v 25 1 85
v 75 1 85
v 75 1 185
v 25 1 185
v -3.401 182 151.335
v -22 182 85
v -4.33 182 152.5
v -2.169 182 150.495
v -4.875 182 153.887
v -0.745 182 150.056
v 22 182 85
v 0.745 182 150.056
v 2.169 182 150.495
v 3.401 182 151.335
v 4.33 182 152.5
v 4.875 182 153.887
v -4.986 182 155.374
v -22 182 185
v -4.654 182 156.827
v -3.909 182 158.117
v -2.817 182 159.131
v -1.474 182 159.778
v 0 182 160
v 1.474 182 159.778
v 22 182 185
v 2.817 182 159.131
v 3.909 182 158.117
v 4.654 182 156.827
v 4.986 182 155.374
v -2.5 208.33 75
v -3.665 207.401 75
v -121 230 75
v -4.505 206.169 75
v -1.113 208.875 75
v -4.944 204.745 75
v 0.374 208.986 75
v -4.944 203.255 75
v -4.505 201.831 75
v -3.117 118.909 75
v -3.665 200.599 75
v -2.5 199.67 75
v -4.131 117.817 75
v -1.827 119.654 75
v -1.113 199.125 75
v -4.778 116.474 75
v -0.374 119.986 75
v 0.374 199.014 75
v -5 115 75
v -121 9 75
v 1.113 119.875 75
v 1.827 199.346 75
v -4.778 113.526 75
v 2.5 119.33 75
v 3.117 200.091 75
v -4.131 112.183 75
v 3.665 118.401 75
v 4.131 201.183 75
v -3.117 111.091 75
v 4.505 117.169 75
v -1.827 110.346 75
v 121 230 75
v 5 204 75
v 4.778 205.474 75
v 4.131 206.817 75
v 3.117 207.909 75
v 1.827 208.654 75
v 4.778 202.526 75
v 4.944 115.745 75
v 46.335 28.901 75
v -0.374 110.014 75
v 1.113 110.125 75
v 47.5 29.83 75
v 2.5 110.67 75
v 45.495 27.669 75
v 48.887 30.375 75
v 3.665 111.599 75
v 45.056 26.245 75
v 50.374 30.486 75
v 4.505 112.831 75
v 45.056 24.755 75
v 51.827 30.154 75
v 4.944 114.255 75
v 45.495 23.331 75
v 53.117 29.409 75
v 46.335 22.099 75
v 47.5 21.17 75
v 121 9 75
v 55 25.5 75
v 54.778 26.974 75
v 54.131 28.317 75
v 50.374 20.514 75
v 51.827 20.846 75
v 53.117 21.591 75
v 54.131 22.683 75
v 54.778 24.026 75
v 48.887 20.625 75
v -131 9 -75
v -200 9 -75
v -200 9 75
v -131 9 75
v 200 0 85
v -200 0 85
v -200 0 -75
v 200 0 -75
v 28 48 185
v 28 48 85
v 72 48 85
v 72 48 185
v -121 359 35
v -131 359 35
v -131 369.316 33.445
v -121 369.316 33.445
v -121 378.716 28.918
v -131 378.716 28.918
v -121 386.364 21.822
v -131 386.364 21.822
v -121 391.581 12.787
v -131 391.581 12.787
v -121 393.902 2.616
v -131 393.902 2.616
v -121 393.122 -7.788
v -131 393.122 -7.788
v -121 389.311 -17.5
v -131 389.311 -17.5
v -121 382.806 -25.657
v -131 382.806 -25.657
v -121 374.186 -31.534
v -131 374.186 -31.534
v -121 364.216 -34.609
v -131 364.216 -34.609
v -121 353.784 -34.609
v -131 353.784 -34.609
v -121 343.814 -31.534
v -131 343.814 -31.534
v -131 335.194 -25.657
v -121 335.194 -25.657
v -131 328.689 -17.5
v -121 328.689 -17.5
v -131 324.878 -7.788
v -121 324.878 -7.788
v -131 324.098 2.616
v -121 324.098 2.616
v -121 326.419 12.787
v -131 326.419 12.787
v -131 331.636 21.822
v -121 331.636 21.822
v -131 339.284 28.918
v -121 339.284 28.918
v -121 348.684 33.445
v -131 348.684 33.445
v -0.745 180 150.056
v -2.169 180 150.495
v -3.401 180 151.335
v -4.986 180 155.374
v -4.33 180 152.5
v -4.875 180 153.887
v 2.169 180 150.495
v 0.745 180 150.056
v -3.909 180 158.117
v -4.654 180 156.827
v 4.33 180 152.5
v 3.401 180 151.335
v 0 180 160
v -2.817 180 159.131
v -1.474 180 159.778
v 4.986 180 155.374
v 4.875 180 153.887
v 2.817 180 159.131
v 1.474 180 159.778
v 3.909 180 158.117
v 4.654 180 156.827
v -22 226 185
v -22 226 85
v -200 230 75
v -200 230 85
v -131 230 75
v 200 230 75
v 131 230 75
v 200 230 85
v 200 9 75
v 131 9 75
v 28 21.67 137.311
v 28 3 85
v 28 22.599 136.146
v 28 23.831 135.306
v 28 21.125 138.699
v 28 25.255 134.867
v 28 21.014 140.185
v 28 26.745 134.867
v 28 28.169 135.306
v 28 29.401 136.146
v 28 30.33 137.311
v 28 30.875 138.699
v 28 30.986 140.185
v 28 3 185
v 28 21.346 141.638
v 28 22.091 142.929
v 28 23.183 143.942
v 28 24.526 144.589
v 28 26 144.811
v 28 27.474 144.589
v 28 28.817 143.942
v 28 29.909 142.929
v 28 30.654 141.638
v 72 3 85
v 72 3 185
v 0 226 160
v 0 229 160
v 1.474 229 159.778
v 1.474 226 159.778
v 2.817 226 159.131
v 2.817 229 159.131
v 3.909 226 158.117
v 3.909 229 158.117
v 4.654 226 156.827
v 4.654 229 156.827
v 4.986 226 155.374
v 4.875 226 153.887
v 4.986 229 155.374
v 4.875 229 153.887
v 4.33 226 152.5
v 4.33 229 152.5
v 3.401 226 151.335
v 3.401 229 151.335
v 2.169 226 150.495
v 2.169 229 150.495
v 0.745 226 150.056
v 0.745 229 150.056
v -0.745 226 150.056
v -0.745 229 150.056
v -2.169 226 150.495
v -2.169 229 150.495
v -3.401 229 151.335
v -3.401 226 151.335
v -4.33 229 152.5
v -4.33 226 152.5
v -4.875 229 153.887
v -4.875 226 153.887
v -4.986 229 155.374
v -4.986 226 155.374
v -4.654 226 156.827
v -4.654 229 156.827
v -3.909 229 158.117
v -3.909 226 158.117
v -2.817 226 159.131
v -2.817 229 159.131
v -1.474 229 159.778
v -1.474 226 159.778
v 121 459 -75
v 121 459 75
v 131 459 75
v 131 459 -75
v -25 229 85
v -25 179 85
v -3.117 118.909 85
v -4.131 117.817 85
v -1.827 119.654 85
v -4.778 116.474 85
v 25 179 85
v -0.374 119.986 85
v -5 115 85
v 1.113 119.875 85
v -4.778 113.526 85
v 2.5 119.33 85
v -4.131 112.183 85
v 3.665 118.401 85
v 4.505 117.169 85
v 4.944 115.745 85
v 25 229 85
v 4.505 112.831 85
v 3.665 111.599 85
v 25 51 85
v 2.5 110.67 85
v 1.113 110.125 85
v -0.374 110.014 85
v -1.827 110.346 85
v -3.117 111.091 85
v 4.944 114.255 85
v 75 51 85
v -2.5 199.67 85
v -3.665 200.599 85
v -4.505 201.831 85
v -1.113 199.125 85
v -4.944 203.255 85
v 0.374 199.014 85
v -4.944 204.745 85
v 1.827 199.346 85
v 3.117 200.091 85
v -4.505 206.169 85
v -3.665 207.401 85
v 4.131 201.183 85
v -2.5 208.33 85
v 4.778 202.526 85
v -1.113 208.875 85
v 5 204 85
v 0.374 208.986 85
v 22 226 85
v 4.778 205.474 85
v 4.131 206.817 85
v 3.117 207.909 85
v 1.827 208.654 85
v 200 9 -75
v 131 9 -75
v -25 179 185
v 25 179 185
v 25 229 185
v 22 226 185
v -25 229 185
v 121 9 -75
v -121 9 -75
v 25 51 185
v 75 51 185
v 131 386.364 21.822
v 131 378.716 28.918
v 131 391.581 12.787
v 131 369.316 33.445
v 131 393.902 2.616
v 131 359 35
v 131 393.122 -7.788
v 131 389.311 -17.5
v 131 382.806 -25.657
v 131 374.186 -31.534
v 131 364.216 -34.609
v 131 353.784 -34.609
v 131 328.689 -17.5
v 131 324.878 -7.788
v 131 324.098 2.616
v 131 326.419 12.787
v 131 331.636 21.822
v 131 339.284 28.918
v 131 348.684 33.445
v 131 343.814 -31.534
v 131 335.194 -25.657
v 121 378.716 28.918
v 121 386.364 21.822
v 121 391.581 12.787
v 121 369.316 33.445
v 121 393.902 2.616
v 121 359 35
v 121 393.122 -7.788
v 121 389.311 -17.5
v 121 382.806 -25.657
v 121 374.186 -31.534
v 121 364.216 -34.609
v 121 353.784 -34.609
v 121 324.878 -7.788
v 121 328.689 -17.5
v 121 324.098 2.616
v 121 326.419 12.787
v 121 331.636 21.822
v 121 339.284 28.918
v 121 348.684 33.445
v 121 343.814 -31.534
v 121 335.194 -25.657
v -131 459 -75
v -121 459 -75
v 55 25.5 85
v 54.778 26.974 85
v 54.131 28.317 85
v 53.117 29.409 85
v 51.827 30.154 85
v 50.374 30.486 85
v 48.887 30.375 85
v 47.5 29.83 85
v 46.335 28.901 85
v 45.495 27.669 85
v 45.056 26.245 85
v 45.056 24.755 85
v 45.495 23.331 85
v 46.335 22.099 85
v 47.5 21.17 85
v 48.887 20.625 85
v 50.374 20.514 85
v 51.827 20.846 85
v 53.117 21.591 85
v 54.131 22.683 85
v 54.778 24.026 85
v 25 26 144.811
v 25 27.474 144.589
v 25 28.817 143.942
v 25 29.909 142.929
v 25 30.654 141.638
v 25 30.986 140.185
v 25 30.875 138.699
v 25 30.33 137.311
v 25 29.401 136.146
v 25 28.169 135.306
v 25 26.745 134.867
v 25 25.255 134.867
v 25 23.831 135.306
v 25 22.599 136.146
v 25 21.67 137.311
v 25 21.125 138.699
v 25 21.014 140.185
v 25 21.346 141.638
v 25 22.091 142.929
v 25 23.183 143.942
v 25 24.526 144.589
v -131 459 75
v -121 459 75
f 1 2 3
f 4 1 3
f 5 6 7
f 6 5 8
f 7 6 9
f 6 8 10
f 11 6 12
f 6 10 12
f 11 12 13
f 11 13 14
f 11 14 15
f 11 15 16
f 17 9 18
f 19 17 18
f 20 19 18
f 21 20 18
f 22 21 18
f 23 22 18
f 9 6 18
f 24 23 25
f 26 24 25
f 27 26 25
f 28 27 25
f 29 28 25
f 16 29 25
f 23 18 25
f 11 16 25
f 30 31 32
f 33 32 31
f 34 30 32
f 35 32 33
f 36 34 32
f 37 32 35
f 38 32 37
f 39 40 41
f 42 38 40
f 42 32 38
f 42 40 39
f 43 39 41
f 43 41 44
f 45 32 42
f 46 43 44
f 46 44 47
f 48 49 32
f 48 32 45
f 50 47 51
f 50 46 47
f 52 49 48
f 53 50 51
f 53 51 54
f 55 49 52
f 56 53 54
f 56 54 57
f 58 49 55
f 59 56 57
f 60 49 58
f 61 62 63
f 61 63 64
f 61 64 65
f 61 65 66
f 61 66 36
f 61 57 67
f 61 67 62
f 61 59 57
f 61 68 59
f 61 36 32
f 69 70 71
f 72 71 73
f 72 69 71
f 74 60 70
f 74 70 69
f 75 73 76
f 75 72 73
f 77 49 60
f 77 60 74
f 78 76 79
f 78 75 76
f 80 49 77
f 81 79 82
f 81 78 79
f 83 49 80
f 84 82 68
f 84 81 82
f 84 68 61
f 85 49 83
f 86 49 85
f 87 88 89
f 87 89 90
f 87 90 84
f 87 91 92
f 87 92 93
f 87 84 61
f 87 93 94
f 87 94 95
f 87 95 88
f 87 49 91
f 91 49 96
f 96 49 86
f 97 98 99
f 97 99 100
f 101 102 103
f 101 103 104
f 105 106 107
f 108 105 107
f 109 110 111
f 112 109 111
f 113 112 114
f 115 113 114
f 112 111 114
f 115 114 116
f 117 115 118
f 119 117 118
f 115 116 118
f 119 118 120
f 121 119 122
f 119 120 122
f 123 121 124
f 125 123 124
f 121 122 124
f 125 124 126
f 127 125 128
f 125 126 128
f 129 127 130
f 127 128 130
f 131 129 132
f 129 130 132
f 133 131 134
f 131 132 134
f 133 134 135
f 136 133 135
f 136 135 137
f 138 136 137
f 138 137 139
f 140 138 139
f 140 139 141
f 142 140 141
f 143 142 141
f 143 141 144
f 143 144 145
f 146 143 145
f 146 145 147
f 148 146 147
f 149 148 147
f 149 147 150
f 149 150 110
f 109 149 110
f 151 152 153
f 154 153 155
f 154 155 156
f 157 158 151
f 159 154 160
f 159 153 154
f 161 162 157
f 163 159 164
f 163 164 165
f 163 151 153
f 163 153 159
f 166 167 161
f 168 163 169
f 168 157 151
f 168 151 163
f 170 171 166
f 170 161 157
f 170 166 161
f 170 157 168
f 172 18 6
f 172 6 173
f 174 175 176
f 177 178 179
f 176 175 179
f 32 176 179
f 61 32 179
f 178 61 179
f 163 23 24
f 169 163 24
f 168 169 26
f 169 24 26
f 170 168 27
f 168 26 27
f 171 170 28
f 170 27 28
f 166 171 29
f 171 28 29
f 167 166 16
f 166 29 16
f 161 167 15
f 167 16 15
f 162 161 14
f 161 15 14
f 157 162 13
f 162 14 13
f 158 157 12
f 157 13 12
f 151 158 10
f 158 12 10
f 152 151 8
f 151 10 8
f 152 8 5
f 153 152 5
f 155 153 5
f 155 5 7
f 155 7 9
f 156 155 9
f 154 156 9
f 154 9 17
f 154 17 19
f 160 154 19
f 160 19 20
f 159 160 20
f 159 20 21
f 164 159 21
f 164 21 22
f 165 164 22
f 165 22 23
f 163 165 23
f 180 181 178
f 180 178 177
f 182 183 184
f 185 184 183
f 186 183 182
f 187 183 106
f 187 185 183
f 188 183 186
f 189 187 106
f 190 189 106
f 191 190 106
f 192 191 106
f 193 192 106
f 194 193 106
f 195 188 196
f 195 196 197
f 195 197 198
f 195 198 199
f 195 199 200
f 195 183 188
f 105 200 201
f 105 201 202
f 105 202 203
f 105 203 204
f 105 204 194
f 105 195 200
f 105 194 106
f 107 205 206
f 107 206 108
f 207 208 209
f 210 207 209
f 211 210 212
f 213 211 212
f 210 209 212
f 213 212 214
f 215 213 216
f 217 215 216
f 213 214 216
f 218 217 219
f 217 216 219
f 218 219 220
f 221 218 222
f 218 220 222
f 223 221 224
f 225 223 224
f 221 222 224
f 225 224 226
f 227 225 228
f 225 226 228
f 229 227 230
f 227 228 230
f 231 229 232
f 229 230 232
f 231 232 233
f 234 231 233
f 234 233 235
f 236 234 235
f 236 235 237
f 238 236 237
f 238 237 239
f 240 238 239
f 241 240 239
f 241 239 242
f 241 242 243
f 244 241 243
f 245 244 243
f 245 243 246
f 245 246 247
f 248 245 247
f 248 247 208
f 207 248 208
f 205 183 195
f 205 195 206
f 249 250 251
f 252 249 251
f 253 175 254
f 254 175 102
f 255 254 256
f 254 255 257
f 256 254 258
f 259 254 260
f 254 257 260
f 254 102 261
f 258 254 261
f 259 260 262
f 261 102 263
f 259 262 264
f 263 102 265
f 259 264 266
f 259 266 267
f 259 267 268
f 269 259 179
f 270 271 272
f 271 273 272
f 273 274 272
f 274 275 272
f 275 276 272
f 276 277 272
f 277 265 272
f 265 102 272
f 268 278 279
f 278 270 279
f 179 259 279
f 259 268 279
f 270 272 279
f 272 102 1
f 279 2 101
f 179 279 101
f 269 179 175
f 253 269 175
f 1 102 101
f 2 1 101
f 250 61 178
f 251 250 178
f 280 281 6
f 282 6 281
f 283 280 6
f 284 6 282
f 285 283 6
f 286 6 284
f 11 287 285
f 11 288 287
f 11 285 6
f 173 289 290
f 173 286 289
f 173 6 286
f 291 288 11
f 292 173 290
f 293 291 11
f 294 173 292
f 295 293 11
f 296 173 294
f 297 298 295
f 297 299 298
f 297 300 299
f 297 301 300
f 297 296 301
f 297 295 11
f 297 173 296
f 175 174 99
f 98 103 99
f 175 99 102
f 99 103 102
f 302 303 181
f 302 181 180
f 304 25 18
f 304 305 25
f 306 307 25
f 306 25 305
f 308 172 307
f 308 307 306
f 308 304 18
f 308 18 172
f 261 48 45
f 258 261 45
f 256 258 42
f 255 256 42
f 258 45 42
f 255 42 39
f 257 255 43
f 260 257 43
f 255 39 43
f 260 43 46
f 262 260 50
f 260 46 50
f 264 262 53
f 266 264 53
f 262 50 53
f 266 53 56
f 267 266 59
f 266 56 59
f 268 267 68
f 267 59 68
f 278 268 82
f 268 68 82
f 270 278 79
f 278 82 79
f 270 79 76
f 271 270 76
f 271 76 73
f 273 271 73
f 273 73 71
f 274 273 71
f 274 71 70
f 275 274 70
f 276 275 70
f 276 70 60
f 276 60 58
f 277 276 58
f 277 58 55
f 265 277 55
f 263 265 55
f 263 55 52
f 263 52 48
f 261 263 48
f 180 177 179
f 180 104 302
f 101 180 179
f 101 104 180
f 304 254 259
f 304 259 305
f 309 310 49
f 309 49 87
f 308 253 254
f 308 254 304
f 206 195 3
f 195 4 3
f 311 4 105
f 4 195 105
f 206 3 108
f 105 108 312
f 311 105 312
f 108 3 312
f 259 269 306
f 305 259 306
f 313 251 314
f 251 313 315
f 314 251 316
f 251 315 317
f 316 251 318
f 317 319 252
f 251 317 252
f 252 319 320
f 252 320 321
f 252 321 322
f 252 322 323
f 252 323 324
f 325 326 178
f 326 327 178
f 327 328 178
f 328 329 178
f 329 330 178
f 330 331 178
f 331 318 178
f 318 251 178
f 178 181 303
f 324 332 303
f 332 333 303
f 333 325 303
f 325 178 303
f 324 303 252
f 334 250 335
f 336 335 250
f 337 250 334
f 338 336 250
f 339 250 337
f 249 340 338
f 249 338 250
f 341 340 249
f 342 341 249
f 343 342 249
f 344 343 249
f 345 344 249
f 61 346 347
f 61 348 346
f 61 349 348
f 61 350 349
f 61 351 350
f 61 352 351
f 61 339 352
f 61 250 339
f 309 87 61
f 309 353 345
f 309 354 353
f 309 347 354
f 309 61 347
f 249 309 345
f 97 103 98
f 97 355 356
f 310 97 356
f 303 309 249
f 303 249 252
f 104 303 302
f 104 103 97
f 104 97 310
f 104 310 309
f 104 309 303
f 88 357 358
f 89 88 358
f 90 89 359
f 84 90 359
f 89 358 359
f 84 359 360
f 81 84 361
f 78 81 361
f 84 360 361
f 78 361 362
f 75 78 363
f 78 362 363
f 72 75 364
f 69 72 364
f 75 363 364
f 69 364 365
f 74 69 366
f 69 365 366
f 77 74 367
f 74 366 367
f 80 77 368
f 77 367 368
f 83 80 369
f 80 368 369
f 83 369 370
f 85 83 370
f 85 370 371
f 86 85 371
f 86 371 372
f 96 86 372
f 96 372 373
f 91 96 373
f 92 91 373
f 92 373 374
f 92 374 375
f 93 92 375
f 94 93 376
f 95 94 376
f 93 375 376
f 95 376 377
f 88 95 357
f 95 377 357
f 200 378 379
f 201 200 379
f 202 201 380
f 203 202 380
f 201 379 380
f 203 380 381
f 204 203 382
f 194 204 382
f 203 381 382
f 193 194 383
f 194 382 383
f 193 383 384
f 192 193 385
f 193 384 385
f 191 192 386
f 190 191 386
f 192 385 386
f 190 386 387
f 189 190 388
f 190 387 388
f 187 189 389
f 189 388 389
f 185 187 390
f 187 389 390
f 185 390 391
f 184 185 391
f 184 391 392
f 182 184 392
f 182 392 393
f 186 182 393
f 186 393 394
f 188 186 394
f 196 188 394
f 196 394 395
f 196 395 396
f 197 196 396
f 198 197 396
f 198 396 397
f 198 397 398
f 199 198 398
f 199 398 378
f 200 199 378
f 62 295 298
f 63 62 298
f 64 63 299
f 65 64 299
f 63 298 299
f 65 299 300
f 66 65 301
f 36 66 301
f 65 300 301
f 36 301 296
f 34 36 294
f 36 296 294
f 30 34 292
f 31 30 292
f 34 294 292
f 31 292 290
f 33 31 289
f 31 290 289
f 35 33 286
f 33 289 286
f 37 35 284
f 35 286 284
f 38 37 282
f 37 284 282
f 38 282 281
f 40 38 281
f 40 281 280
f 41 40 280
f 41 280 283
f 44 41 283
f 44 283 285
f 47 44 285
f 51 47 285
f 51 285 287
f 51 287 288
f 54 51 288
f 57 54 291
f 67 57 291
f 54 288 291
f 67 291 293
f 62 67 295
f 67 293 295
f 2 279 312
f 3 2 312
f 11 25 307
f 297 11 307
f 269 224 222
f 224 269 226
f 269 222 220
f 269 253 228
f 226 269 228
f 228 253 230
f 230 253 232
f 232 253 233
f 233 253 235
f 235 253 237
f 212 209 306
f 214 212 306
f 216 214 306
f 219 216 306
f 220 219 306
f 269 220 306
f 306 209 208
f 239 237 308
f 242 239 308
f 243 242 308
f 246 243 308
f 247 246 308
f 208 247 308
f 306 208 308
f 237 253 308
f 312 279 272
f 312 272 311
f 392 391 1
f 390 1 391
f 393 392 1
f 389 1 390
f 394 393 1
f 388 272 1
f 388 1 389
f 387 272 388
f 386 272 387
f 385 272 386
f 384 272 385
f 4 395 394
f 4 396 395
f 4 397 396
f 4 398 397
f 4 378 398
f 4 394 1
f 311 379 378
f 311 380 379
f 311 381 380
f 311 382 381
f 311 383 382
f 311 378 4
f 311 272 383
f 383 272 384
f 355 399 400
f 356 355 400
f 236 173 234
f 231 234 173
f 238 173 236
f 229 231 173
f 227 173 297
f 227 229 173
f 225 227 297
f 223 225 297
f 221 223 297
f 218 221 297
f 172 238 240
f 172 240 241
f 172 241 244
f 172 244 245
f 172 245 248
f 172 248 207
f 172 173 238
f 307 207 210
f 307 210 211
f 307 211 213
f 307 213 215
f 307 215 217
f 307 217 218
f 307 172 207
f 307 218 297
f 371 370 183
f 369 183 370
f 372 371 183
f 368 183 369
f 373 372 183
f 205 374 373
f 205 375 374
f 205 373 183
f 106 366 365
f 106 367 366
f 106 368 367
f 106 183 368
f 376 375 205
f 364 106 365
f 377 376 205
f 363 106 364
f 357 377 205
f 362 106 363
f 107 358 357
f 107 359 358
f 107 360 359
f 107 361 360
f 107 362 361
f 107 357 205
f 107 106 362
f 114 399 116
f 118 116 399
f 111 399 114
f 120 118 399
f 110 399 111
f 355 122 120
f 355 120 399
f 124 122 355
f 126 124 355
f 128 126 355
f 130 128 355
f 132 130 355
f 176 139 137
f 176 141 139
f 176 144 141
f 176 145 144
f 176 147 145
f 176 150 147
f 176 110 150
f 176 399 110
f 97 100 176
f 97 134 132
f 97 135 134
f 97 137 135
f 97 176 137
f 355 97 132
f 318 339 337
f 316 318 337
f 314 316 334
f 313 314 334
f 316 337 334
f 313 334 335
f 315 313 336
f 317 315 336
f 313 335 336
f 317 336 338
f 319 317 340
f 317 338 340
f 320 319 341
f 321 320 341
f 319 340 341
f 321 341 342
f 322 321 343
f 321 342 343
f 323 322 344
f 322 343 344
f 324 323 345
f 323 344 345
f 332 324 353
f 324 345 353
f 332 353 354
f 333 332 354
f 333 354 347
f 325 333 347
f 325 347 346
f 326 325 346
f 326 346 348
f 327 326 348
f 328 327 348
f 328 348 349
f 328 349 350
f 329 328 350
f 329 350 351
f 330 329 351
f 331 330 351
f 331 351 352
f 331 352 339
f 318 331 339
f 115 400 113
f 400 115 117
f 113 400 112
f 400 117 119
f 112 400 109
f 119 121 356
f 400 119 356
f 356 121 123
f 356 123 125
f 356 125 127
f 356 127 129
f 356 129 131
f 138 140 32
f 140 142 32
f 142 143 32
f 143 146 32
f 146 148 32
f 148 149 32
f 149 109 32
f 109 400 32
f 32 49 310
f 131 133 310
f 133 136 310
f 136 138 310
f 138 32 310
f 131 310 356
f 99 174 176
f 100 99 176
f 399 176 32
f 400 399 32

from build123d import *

# Parameters (mm, degrees)
ESBO_O1_W                = 400
ESBO_O1_H                = 150
RESSALTO_EXTRUS_O1_DEPTH = 9
ESBO_O2_W                = 10
ESBO_O2_H                = 150
RESSALTO_EXTRUS_O2_DEPTH = 450
ESBO_O5_R                = 35
CORTE_EXTRUS_O1_DEPTH    = 300
ESBO_O6_W                = 400
ESBO_O6_H                = 10
RESSALTO_EXTRUS_O4_DEPTH = 230
ESBO_O8_W                = 100
ESBO_O8_H                = 50
RESSALTO_EXTRUS_O5_DEPTH = 25
ESBO_O9_R                = 5
CORTE_EXTRUS_O3_DEPTH    = 50
ESBO_O7_R                = 5
CORTE_EXTRUS_O2_DEPTH    = 150
ESBO_O11_W               = 100
ESBO_O11_H               = 50
RESSALTO_EXTRUS_O6_DEPTH = 50
ESBO_O12_R               = 5
CORTE_EXTRUS_O4_DEPTH    = 30
ESBO_O13_W               = 44
ESBO_O13_H               = 45
ESBO_O13_H_2             = 44
CORTE_EXTRUS_O5_DEPTH    = 100
ESBO_O14_R               = 5
CORTE_EXTRUS_O6_DEPTH    = 10


with BuildPart() as part:
    # Esboço1 → Ressalto-extrusão1 (new body)
    with BuildSketch(Plane(origin=(0, 0, 0), x_dir=(1, 0, 0), z_dir=(0, 1, 0))):
        Rectangle(ESBO_O1_W, ESBO_O1_H)
    extrude(amount=RESSALTO_EXTRUS_O1_DEPTH)

    # Esboço2 → Ressalto-extrusão2 (add)
    with BuildSketch(Plane(origin=(0, 9, 0), x_dir=(1, 0, 0), z_dir=(0, 1, 0))):
        with Locations((-126, 0)):
            Rectangle(ESBO_O2_W, ESBO_O2_H)
        with Locations((126, 0)):
            Rectangle(ESBO_O2_W, ESBO_O2_H)
    extrude(amount=RESSALTO_EXTRUS_O2_DEPTH)

    # Esboço5 → Corte-extrusão1 (cut)
    with BuildSketch(Plane.ZY.offset(131)):
        with Locations((0, 359)):
            Circle(ESBO_O5_R)
    extrude(amount=-CORTE_EXTRUS_O1_DEPTH, mode=Mode.SUBTRACT)

    # Esboço6 → Ressalto-extrusão4 (add)
    with BuildSketch(Plane.XZ):
        with Locations((0, 80)):
            Rectangle(ESBO_O6_W, ESBO_O6_H)
    extrude(amount=-RESSALTO_EXTRUS_O4_DEPTH)

    # Esboço8 → Ressalto-extrusão5 (add, symmetric)
    with BuildSketch(Plane.ZY):
        with Locations((135, 204)):
            Rectangle(ESBO_O8_W, ESBO_O8_H)
    extrude(amount=RESSALTO_EXTRUS_O5_DEPTH, both=True)

    # Esboço9 → Corte-extrusão3 (cut)
    with BuildSketch(Plane(origin=(0, 230, 0), x_dir=(-1, 0, 0), z_dir=(0, 1, 0))):
        with Locations(Location((0, 155, 0), (0, 0, 90))):
            Circle(ESBO_O9_R)
    extrude(amount=-CORTE_EXTRUS_O3_DEPTH, mode=Mode.SUBTRACT)

    # Esboço7 → Corte-extrusão2 (cut)
    with BuildSketch(Plane(origin=(0, 0, 75), x_dir=(-1, 0, 0), z_dir=(0, 0, -1))):
        with Locations((0, 115)):
            Circle(ESBO_O7_R)
    extrude(amount=-CORTE_EXTRUS_O2_DEPTH, mode=Mode.SUBTRACT)

    # Esboço11 → Ressalto-extrusão6 (add)
    with BuildSketch(Plane.ZY.offset(-75)):
        with Locations((135, 26)):
            Rectangle(ESBO_O11_W, ESBO_O11_H)
    extrude(amount=RESSALTO_EXTRUS_O6_DEPTH)

    # Esboço12 → Corte-extrusão4 (cut)
    with BuildSketch(Plane.ZY.offset(-25)):
        with Locations((139.811131484, 26)):
            Circle(ESBO_O12_R)
    extrude(amount=-CORTE_EXTRUS_O4_DEPTH, mode=Mode.SUBTRACT)

    # Esboço13 → Corte-extrusão5 (cut)
    with BuildSketch(Plane.XY.offset(185)):
        with Locations((50, 25.5)):
            Rectangle(ESBO_O13_W, ESBO_O13_H)
        with Locations((0, 204)):
            Rectangle(ESBO_O13_W, ESBO_O13_H_2)
    extrude(amount=-CORTE_EXTRUS_O5_DEPTH, mode=Mode.SUBTRACT)

    # Esboço14 → Corte-extrusão6 (cut)
    with BuildSketch(Plane.XY.offset(85)):
        with Locations((0, 204)):
            Circle(ESBO_O14_R)
        with Locations((50, 25.5)):
            Circle(ESBO_O14_R)
    extrude(amount=-CORTE_EXTRUS_O6_DEPTH, mode=Mode.SUBTRACT)


solid = part.part
